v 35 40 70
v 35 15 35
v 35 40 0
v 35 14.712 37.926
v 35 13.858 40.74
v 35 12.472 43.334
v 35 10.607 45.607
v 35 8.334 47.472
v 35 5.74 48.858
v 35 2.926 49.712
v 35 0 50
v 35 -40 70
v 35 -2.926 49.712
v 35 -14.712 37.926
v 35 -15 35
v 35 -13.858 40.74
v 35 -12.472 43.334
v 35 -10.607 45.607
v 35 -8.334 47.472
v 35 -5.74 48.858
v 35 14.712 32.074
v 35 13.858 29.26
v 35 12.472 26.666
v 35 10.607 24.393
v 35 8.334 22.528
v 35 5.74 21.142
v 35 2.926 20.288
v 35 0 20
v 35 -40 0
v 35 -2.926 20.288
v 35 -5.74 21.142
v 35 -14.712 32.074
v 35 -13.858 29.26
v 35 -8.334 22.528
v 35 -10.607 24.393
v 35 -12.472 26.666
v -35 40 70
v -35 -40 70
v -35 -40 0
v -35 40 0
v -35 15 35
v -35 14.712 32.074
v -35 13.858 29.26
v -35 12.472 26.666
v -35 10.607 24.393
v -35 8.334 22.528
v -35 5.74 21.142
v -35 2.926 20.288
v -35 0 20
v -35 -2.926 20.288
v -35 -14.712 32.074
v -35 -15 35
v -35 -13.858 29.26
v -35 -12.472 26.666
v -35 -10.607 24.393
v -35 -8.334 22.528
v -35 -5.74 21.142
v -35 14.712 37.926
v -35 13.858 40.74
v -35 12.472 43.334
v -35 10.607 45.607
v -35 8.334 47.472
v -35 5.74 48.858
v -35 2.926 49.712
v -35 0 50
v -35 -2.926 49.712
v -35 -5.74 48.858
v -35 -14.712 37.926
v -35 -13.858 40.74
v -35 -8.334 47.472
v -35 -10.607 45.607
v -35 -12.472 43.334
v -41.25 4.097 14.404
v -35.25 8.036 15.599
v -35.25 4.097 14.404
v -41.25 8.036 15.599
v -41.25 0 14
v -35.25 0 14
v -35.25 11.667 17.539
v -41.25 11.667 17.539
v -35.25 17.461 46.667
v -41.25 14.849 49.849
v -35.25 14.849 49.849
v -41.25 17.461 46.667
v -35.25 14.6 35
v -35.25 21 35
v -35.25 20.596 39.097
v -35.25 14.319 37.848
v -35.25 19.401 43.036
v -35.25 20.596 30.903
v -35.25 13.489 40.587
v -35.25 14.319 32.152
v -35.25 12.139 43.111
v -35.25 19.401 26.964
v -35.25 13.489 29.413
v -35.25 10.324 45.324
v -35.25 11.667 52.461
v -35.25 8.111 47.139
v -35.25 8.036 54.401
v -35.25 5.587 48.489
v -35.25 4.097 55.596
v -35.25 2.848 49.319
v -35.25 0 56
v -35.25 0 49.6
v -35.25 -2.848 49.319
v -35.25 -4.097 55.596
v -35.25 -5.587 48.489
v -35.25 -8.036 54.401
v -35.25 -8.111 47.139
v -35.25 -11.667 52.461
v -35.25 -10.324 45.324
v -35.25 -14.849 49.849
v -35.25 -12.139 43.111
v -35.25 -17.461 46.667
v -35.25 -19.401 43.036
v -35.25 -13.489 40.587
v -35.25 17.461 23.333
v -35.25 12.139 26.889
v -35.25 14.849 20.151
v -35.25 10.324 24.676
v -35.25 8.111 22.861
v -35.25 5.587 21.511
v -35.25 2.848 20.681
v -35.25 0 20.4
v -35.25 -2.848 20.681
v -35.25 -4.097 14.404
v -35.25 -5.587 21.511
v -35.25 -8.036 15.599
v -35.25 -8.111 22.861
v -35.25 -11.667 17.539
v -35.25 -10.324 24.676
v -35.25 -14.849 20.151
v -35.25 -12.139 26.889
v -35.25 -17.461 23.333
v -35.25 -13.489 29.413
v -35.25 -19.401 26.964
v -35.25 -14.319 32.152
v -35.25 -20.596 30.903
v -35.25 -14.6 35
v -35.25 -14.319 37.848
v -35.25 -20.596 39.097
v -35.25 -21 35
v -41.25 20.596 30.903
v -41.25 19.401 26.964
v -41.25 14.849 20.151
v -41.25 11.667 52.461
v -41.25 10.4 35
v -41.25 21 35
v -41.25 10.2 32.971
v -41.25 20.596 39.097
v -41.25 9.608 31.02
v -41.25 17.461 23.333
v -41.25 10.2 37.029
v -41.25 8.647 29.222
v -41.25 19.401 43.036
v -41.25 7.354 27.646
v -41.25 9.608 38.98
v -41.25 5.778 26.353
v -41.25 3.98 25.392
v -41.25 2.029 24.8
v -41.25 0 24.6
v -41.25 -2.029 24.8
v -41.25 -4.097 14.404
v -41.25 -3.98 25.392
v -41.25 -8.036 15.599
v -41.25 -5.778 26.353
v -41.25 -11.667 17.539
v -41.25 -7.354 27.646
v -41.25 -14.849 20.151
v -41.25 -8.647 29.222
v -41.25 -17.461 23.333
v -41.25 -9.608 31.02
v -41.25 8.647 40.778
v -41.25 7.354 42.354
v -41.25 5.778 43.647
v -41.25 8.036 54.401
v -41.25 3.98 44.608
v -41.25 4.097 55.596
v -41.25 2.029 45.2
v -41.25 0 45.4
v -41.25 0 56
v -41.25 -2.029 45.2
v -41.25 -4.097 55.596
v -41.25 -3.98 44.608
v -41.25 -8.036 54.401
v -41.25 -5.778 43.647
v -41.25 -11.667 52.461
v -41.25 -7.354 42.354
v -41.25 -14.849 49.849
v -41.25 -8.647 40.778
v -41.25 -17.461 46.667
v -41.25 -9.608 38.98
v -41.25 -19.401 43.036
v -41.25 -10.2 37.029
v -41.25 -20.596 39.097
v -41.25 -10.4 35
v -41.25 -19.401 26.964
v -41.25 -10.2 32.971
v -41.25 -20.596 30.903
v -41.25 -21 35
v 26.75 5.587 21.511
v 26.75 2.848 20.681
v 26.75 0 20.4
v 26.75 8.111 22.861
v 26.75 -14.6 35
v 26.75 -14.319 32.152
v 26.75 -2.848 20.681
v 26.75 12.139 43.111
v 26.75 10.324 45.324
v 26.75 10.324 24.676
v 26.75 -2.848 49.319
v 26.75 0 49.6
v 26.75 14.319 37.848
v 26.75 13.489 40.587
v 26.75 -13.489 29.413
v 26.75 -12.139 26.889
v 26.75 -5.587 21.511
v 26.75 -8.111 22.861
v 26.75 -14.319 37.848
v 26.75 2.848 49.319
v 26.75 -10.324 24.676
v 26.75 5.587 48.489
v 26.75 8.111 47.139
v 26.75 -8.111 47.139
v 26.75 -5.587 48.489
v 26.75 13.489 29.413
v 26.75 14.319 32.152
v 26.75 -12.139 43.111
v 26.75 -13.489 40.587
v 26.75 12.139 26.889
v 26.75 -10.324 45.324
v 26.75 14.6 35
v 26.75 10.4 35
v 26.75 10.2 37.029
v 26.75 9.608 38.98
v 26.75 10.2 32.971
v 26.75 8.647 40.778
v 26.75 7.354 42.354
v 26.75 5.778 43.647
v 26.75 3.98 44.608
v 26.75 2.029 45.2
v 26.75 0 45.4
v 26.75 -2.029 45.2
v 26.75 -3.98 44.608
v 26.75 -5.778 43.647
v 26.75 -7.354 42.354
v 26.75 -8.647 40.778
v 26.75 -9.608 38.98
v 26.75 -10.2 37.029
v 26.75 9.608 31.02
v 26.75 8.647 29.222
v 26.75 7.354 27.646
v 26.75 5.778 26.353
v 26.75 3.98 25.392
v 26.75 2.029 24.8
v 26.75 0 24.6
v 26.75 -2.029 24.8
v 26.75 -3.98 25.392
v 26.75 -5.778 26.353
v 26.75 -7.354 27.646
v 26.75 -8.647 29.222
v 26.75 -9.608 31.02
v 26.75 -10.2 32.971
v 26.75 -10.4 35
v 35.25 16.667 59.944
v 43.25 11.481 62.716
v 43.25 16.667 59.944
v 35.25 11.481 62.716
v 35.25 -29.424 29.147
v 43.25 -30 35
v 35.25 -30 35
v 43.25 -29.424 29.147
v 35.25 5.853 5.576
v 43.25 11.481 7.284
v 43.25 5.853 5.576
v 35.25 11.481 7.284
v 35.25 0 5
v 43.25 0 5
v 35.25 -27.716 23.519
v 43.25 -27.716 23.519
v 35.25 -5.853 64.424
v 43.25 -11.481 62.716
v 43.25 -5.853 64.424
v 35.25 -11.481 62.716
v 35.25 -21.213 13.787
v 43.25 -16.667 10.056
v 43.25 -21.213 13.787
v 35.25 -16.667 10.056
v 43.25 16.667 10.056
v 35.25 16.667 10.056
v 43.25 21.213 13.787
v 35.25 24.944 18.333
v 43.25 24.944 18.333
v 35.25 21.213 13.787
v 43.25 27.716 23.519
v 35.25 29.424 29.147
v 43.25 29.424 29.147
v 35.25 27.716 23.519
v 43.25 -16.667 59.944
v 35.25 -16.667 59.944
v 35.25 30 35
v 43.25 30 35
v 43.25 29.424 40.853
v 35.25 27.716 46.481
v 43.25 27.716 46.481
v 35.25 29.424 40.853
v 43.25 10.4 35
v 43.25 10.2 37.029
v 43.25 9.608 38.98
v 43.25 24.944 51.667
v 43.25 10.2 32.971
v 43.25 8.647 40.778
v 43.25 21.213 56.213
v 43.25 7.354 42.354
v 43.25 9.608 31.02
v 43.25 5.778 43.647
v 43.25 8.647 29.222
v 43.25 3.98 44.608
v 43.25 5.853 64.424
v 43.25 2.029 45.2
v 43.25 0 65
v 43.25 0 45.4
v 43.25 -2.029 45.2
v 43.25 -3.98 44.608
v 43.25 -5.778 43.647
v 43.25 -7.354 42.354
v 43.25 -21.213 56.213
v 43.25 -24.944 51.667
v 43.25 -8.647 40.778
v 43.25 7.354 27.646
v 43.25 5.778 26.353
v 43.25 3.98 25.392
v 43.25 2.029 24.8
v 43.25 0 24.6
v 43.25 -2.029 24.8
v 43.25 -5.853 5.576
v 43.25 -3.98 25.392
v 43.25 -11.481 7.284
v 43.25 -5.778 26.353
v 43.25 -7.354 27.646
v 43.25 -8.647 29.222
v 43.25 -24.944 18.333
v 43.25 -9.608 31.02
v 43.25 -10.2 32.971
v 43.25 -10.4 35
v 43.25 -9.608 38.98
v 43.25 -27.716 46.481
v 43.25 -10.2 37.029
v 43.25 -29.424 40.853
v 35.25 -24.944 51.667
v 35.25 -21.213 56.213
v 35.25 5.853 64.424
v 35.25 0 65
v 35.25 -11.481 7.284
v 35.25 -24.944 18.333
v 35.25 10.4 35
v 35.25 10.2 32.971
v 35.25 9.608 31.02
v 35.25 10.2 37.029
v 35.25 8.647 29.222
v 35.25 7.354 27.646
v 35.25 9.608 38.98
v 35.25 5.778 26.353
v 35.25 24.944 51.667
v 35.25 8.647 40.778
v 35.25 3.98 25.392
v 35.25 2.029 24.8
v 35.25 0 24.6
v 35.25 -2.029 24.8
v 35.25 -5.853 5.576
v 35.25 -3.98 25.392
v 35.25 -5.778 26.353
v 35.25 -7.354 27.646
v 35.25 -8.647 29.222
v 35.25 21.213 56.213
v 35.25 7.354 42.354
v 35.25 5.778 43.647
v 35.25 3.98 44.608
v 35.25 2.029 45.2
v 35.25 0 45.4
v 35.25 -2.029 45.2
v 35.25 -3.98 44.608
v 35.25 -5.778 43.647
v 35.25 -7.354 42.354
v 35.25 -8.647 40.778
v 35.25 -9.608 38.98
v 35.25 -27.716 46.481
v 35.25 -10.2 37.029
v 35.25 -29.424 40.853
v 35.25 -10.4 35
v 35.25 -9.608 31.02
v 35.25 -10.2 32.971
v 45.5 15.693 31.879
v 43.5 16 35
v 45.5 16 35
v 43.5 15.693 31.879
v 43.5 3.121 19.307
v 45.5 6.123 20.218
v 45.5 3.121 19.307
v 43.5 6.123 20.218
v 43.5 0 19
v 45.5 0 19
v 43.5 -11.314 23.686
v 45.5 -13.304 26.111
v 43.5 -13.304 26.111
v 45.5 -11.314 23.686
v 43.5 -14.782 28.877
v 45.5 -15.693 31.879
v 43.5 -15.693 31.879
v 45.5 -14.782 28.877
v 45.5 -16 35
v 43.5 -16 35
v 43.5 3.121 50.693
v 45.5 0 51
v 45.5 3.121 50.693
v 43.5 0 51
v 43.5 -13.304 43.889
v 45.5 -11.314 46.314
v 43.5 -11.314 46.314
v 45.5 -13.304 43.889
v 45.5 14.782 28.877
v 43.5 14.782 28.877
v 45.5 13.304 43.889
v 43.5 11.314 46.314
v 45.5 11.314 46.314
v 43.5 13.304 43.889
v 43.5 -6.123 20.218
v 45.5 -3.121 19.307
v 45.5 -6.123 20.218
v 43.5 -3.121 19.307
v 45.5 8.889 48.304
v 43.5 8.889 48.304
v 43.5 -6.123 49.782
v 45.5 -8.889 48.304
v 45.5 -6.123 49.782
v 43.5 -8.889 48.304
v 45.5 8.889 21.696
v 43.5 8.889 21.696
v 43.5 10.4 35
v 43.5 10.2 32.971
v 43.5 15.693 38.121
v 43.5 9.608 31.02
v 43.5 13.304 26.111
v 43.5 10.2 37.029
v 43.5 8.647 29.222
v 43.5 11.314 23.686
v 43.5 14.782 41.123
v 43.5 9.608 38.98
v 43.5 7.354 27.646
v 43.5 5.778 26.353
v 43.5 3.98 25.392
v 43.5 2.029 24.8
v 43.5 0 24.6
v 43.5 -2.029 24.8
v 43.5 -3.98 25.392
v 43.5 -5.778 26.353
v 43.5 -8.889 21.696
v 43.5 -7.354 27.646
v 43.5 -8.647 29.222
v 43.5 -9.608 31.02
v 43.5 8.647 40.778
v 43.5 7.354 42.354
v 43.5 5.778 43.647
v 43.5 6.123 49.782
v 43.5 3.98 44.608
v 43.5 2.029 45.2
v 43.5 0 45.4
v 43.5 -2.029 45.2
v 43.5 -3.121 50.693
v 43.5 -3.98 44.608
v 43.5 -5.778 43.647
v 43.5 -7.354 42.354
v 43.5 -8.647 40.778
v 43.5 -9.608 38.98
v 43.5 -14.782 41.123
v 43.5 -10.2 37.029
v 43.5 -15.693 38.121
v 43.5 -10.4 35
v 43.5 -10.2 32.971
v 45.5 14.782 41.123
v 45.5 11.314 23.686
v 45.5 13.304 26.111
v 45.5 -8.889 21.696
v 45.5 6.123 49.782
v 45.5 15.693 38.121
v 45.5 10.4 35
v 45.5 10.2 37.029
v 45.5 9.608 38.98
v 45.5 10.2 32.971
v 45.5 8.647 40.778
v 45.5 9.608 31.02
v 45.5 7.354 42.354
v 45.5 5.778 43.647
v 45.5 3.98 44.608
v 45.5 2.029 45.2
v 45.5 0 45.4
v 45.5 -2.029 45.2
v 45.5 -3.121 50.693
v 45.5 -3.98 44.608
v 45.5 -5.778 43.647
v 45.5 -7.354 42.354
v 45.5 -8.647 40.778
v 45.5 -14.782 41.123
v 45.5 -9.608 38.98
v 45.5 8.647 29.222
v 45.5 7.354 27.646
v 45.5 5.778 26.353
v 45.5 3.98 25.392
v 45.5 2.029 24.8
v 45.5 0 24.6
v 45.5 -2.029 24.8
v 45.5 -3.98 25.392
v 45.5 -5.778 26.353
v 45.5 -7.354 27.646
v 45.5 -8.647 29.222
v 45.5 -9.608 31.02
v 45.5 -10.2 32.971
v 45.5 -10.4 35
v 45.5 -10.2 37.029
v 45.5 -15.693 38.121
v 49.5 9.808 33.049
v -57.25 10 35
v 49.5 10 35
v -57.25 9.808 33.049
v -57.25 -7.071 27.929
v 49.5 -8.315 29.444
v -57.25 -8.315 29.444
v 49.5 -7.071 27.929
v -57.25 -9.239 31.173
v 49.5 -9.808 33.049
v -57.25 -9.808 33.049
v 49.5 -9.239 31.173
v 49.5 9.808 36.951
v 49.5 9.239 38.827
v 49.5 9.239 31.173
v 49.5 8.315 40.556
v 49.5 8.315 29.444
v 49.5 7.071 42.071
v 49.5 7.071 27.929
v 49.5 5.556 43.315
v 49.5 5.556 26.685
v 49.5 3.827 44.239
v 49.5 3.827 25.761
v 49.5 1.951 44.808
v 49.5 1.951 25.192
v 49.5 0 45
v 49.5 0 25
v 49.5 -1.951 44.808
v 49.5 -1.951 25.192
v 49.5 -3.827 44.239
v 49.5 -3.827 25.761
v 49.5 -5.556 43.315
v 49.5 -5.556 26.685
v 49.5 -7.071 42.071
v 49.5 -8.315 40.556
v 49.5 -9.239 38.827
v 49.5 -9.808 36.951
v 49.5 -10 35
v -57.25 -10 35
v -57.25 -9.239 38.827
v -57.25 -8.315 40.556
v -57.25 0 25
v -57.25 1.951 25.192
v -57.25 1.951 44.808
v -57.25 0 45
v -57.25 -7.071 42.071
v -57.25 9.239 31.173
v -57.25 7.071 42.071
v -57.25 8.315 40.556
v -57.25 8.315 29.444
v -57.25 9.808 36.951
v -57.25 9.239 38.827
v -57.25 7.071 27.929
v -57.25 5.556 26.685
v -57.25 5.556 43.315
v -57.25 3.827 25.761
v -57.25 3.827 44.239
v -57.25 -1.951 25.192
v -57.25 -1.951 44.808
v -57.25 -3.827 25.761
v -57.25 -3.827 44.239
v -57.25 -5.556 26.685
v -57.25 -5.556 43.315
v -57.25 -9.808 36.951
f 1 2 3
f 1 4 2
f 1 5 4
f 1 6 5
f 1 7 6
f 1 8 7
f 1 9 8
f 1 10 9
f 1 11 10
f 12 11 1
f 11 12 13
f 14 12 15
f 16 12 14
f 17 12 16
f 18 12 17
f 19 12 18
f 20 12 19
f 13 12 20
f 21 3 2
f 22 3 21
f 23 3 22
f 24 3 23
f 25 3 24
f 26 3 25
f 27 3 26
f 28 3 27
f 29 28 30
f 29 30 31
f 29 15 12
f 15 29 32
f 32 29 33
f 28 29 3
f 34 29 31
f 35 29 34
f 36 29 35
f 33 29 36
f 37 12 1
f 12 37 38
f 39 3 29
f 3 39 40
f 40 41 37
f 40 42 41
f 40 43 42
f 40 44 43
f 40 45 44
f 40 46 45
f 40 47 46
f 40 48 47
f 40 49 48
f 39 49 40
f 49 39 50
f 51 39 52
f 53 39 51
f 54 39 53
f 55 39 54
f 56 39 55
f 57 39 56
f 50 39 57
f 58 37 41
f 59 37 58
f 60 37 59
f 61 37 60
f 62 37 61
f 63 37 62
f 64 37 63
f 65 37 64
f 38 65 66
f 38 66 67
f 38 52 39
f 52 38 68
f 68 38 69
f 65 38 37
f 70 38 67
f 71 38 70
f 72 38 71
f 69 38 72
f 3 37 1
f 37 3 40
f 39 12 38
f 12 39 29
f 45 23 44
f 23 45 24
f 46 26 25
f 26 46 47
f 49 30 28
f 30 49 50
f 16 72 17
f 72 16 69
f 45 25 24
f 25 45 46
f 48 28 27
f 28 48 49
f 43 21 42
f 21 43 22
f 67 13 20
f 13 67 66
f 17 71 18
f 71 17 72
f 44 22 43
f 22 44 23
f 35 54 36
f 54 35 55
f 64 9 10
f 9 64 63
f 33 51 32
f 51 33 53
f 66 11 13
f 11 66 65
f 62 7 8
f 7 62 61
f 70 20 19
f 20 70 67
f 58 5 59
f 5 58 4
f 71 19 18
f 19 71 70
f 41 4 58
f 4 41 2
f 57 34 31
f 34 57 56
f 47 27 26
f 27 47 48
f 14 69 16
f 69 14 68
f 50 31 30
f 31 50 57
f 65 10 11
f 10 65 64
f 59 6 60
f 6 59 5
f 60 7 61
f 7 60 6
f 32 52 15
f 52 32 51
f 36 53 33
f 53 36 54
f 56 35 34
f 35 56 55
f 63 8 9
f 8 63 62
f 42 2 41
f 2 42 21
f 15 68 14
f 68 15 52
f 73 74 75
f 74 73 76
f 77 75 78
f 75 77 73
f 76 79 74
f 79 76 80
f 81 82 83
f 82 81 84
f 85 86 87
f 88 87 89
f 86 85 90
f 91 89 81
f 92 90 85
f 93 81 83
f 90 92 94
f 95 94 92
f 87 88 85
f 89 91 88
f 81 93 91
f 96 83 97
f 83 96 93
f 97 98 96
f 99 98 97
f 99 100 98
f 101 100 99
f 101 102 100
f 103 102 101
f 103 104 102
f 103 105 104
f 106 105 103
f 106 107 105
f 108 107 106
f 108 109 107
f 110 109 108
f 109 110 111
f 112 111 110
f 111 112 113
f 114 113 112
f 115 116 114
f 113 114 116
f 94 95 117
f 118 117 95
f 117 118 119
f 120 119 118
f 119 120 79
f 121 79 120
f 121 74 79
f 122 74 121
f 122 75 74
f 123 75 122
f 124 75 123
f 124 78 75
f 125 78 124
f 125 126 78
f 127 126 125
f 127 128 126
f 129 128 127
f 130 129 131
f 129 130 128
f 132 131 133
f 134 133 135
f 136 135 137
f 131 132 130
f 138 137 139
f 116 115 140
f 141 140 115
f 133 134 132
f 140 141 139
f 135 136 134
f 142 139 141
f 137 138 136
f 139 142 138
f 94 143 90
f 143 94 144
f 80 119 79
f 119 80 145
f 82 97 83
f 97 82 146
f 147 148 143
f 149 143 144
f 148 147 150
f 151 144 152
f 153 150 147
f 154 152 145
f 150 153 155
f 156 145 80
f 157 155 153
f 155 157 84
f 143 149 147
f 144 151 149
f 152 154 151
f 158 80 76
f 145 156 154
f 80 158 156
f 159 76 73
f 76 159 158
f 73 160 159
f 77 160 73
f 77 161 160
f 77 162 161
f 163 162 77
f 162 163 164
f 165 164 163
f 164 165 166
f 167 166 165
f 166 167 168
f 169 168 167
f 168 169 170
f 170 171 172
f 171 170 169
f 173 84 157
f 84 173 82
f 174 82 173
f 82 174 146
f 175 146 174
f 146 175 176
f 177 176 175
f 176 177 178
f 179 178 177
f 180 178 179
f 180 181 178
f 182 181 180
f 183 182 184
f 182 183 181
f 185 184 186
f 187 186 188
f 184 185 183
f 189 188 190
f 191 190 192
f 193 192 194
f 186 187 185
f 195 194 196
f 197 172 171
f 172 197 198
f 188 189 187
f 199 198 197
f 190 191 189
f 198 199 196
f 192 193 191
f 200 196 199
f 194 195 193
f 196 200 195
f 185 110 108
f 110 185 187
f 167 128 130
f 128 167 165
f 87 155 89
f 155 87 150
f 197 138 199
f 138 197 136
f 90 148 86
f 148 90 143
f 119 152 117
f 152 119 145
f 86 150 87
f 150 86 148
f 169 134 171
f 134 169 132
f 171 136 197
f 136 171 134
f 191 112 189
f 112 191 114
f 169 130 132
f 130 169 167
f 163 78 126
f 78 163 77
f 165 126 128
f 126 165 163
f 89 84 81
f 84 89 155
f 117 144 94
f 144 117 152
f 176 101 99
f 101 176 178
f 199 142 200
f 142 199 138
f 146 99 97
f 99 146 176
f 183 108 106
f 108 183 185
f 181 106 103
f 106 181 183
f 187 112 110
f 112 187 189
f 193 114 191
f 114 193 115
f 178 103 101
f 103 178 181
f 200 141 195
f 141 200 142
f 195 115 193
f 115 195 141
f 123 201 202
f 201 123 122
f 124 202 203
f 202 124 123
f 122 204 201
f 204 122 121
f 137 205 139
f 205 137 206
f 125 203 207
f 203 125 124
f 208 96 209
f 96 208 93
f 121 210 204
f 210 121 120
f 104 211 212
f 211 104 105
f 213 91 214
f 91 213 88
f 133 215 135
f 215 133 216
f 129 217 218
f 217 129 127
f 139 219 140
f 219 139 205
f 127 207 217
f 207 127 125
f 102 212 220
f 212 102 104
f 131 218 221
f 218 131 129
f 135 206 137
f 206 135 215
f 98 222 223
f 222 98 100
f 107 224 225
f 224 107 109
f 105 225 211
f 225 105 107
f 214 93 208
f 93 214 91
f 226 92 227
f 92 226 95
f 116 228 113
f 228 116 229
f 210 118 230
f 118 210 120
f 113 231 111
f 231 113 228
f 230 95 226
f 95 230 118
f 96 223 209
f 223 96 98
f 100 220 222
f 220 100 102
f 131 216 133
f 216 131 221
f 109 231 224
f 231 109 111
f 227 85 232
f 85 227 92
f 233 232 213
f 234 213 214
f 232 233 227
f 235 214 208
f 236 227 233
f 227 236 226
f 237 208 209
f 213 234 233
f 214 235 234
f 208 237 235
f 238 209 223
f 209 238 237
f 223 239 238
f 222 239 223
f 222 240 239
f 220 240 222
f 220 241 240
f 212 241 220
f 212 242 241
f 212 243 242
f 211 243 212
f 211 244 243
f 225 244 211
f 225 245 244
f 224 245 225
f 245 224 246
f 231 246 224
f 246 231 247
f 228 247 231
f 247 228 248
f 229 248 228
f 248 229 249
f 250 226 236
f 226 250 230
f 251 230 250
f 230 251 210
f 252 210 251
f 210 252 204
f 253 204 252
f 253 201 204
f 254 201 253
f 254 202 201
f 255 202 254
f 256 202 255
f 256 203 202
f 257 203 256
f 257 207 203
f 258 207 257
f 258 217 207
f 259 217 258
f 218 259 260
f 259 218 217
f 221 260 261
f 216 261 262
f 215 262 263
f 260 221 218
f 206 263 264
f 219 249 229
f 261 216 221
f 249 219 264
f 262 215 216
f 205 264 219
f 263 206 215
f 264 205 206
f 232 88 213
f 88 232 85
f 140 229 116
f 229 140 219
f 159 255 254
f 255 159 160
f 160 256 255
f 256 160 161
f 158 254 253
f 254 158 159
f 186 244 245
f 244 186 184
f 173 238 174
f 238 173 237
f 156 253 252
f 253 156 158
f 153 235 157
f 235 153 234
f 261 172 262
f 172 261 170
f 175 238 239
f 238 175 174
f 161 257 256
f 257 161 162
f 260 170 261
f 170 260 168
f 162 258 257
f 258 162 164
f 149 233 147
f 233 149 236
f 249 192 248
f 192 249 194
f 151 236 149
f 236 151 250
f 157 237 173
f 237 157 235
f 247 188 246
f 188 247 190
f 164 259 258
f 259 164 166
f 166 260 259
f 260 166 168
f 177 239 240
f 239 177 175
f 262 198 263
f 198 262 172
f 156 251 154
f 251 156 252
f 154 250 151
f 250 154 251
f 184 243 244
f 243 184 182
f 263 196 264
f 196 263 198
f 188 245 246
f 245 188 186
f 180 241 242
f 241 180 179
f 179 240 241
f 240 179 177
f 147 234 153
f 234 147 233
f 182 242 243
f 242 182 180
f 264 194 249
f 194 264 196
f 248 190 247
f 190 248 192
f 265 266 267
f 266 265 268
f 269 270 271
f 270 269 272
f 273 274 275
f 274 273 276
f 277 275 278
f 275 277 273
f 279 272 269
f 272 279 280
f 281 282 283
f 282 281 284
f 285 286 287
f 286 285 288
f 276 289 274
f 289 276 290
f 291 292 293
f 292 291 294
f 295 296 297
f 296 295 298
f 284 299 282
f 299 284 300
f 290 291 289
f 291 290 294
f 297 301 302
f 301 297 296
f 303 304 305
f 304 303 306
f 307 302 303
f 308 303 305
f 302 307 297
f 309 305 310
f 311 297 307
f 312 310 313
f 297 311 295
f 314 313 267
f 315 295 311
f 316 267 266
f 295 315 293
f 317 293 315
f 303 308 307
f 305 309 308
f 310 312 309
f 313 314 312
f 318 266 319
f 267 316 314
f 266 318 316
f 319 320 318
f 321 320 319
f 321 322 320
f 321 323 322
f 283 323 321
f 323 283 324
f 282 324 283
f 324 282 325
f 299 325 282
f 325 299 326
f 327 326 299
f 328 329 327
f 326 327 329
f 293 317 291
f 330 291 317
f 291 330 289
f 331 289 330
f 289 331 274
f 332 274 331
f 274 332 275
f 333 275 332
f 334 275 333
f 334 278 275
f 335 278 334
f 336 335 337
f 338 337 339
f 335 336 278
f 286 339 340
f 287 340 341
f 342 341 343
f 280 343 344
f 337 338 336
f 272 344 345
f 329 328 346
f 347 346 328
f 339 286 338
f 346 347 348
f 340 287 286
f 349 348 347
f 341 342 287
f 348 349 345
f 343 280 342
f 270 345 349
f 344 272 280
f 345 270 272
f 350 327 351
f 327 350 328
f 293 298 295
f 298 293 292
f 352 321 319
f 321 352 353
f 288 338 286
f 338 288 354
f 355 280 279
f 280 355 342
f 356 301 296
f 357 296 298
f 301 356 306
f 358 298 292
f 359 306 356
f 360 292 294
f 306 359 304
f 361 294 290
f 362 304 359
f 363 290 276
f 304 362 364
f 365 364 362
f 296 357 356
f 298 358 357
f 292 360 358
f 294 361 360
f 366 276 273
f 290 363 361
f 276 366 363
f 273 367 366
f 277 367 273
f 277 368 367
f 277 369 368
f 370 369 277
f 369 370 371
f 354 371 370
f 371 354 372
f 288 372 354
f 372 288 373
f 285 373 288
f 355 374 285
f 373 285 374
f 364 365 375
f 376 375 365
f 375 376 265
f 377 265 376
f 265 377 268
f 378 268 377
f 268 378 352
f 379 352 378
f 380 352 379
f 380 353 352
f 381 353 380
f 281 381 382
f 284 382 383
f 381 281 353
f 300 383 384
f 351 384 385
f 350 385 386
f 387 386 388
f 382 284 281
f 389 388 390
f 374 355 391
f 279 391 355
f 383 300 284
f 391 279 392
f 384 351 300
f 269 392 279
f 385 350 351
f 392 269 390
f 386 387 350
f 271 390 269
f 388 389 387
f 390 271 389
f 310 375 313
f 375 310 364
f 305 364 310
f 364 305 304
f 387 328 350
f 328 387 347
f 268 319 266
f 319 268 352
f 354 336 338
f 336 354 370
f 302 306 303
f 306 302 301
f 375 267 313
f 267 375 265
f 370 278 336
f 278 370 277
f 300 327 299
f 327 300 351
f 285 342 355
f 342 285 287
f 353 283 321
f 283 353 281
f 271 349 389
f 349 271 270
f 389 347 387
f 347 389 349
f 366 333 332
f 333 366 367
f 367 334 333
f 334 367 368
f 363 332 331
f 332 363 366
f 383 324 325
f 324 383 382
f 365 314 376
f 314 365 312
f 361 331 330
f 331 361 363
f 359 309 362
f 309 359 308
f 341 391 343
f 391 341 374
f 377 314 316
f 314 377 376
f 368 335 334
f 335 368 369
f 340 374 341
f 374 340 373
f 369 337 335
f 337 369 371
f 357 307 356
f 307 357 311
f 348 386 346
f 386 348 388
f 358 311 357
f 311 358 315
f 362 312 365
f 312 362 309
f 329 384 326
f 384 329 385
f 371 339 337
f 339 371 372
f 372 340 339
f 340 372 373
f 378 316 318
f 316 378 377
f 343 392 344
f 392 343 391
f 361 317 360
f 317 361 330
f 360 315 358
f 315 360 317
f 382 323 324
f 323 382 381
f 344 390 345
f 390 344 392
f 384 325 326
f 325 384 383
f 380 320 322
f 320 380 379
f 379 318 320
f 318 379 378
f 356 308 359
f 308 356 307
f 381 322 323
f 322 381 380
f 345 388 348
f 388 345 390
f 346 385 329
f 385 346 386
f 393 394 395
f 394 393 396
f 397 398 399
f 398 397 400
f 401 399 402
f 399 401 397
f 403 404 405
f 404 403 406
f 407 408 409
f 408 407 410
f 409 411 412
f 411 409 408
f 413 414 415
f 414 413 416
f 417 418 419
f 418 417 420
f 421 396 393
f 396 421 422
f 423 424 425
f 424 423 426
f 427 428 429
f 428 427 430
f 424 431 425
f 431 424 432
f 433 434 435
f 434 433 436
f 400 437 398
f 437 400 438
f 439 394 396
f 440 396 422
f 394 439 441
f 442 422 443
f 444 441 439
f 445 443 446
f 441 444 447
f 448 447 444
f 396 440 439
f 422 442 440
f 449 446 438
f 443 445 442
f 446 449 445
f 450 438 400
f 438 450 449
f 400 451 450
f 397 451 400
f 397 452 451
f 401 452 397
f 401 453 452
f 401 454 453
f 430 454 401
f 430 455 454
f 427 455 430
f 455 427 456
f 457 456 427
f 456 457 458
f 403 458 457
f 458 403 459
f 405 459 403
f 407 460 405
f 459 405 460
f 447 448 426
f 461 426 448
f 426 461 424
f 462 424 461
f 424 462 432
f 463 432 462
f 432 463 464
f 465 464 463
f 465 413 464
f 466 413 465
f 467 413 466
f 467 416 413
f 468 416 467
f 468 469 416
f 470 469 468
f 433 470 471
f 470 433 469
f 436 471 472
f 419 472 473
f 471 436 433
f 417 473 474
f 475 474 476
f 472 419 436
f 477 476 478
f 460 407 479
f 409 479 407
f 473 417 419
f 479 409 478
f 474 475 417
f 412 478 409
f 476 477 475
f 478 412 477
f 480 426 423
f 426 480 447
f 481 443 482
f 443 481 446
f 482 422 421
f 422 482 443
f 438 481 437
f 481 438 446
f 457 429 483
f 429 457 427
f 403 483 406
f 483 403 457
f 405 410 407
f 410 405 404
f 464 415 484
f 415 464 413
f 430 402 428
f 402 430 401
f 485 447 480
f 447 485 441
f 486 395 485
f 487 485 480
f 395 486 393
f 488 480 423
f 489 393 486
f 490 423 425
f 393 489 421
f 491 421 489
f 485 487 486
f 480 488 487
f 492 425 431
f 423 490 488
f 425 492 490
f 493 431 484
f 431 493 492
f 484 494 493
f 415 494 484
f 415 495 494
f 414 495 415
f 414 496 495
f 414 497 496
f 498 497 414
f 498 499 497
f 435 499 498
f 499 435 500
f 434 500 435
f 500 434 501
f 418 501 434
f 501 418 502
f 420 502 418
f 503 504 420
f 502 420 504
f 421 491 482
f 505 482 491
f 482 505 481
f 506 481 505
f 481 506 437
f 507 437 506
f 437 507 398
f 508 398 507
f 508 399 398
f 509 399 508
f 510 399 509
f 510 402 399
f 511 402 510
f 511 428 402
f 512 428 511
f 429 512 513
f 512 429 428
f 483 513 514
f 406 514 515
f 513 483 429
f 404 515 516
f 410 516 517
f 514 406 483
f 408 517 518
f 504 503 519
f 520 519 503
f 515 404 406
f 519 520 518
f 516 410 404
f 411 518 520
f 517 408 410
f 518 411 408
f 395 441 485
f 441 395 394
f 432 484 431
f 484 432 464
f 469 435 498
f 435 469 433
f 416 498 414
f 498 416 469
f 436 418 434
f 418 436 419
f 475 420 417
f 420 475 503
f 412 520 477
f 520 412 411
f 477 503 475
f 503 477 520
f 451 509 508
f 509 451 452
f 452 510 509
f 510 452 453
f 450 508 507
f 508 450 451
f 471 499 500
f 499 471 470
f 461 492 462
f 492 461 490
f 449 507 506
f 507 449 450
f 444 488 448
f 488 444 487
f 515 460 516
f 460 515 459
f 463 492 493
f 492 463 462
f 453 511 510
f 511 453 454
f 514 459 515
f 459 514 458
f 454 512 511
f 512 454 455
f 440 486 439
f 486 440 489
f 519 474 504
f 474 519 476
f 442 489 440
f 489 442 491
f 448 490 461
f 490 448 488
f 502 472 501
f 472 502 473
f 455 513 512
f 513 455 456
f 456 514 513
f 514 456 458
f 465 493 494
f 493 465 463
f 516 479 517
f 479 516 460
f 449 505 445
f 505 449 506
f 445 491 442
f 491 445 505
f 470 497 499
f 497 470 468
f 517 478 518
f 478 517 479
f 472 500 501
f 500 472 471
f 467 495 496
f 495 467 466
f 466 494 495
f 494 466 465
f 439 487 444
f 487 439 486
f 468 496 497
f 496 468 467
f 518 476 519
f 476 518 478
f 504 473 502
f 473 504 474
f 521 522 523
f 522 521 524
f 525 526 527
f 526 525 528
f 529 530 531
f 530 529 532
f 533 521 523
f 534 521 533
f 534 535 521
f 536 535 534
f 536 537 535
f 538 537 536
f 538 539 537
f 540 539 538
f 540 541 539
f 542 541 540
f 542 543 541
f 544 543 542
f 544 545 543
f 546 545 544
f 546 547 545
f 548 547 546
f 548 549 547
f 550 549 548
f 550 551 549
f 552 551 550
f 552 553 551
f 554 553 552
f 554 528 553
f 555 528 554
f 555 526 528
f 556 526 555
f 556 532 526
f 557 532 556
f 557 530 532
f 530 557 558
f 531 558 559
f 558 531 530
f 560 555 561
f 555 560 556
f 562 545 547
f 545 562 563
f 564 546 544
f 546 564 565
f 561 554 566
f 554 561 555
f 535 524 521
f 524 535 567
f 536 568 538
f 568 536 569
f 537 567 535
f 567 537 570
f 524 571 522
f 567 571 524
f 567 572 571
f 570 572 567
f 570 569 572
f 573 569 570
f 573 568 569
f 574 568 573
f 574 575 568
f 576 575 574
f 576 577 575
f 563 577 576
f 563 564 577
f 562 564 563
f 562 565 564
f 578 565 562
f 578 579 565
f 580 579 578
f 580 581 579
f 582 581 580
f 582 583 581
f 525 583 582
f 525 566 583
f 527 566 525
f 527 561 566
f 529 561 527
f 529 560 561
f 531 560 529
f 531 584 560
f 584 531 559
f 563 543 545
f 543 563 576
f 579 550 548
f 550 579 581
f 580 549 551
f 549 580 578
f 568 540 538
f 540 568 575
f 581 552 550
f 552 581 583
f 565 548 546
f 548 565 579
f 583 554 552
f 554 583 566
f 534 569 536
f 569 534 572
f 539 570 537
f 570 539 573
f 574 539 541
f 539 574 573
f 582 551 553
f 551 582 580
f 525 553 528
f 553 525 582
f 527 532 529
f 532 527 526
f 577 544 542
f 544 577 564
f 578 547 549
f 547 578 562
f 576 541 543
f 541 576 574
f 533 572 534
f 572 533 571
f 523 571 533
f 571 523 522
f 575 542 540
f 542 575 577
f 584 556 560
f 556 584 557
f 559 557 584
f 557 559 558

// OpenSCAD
$fn = 32;

// ------------------------------------------------------------------------
// Bushed housing: 70 x 80 x 70 mm housing, bushing d29.2
// Every part is its own module, assembly() places them once.
// ------------------------------------------------------------------------

// --- part 1 ---
module housing() {
  difference() {
    translate([-35, -40, 0]) cube([70, 80, 70]);
    translate([0, 0, 35]) rotate([0, 90, 0]) cylinder(h = 72, d = 30, center = true);
  }
}

// --- part 2 ---
module bushing() {
  difference() {
    union() {
      cylinder(h = 6, d = 42);
      translate([0, 0, 6]) cylinder(h = 62, d = 29.2);
    }
    translate([0, 0, -1]) cylinder(h = 70, d = 20.8);
  }
}

// --- part 3 ---
module shaft() {
  translate([0, 0, -53.375]) cylinder(h = 106.75, d = 20);
}

// --- part 4 ---
module cover() {
  difference() {
    cylinder(h = 8, d = 60);
    translate([0, 0, -1]) cylinder(h = 10, d = 20.8);
  }
}

// --- part 5 ---
module washer() {
  difference() {
      translate([0, 0, 0]) cylinder(h = 2, d = 32);
      translate([0, 0, -1]) cylinder(h = 4, d = 20.8);
    }
}

// --- assembly ---
module assembly() {
  translate([0, 0, 0]) rotate([0, 0, 0]) housing();
  translate([-41.25, 0, 35]) rotate([0, 90, 0]) bushing();
  translate([-3.875, 0, 35]) rotate([0, 90, 0]) shaft();
  translate([35.25, 0, 35]) rotate([0, 90, 0]) cover();
  translate([43.5, 0, 35]) rotate([0, 90, 0]) washer();
}

assembly();
